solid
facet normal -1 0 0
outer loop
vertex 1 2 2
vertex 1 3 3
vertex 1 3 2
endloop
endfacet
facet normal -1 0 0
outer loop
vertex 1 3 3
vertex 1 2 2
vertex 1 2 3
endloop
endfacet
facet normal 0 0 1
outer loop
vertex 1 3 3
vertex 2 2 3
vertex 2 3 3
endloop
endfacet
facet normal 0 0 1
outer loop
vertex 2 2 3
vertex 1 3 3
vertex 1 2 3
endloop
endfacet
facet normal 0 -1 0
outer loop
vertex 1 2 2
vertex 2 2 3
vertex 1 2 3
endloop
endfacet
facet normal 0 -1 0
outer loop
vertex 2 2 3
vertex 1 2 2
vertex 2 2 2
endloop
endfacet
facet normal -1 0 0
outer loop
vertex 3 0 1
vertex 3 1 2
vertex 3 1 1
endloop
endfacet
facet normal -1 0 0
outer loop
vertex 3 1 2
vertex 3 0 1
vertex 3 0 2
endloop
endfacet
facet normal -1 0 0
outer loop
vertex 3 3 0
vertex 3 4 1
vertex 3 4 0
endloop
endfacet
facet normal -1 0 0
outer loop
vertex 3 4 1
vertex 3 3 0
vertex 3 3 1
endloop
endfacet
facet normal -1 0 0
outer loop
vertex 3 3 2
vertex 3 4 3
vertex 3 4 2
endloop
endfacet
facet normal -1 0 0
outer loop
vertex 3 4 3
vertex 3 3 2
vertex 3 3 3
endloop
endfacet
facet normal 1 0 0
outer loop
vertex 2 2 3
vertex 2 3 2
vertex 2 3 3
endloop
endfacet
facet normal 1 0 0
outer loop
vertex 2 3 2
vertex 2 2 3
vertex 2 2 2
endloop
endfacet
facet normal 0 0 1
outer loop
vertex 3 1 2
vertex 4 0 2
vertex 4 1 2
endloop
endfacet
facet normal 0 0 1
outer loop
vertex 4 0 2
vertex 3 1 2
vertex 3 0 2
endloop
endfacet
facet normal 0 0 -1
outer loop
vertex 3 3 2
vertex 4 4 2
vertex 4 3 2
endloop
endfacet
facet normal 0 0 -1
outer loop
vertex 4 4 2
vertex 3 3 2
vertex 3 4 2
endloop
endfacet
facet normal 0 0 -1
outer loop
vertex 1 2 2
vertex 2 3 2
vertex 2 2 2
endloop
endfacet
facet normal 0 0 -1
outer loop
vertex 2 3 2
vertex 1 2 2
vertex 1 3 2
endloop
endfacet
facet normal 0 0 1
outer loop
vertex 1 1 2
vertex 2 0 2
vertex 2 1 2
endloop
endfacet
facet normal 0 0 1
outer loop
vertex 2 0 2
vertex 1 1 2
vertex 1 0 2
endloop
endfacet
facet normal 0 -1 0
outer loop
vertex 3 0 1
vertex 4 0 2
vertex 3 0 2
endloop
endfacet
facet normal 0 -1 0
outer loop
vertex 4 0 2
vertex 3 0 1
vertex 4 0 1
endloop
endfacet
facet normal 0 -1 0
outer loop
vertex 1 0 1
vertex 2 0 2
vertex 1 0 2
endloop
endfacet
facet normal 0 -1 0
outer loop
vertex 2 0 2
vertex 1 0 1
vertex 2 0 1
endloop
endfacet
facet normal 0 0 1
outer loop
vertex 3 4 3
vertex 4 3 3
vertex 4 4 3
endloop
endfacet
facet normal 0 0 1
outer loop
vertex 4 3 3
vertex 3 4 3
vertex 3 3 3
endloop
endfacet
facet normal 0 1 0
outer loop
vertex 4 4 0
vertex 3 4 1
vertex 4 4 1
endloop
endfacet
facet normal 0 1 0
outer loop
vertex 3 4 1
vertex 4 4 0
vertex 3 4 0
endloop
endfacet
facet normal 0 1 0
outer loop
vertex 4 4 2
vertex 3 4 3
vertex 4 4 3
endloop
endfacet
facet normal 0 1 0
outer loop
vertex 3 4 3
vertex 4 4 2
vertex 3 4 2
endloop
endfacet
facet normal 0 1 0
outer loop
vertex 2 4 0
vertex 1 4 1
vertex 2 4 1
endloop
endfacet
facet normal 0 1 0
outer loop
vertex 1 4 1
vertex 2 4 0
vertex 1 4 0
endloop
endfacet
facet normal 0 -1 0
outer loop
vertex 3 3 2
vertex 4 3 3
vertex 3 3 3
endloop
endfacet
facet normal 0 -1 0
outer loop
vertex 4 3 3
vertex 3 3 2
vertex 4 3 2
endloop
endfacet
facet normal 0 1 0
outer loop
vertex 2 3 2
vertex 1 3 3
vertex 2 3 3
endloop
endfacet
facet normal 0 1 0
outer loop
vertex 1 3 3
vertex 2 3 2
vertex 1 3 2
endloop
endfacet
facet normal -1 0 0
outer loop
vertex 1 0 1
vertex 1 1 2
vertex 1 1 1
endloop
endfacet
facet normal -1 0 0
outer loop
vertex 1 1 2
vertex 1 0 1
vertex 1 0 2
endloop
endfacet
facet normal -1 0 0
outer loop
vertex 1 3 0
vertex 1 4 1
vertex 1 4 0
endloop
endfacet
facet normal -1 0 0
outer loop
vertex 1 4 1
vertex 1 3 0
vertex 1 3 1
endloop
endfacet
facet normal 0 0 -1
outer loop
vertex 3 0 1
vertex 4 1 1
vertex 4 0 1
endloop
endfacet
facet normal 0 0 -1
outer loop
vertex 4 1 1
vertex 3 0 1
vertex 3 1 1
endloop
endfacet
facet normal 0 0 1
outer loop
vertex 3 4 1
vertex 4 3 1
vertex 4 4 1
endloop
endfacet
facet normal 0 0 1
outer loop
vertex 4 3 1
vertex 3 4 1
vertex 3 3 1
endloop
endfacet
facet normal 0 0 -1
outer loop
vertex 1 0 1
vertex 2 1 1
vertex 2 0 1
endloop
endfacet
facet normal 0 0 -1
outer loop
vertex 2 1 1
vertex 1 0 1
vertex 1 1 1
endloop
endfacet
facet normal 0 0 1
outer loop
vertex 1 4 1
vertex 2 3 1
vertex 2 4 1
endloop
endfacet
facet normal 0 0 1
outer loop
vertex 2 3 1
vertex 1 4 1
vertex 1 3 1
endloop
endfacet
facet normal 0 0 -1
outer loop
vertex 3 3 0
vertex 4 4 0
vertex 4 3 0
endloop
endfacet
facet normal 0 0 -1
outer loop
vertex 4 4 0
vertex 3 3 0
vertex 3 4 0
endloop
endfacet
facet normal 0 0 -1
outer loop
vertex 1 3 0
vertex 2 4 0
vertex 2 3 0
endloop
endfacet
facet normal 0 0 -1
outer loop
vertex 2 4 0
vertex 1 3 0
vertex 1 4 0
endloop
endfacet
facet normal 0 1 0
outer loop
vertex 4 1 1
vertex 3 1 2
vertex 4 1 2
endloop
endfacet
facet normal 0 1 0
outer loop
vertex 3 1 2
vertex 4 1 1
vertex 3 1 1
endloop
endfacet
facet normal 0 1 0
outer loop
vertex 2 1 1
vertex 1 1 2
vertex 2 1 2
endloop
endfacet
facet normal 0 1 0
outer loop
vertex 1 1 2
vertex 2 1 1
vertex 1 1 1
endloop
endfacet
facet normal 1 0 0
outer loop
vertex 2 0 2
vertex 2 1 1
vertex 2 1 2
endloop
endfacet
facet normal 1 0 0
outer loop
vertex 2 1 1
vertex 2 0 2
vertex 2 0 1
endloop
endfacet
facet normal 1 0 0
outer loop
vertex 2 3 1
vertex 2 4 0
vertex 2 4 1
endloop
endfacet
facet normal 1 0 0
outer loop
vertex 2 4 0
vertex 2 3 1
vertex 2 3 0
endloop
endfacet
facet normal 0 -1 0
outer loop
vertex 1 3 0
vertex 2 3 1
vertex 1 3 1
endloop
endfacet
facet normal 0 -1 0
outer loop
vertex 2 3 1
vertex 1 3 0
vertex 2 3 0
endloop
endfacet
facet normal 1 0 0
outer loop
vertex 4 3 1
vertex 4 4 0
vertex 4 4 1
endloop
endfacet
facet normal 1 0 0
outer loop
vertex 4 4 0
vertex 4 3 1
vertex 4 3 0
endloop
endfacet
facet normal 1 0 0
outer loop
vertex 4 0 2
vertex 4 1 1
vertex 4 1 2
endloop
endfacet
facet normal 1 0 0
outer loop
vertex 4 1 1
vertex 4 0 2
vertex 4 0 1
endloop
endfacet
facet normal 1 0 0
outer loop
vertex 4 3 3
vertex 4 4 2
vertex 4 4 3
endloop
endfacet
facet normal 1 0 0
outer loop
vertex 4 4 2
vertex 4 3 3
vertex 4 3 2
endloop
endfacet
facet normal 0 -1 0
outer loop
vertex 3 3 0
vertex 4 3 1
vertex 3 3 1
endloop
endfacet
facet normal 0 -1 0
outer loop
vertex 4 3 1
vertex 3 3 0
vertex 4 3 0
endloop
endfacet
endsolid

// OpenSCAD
module square(vals) {
	for(r = vals[0]) for(g = vals[1]) for(b = vals[2]) translate([r, g, b]) cube(1);
}
function clamp(v, mn, mx) = min(max(v, mn), mx);
function hueToRgb(h) = [
	clamp(abs(3-6*h) - 1, 0, 1),
	clamp(2-abs(2-6*h), 0, 1),
	clamp(2-abs(4-6*h), 0, 1)
];
squareVals = [
	[[0,2],[1],[3]],
	[[0,1,2],[0,1,3],[2]],
	[[0,2],[1,3],[0]],
	[[0,2],[2],[0,2,3]],
	[[1],[0,1,2],[0,3]],
	[[0,2],[0],[0,1,3]],
	[[0,1,2,3],[3],[1,3]],
	[[3],[0,1,2],[0,2,3]],
	[[0,1,2,3],[1,2],[1]]
];
difference() {
	cube([4, 4, 4]);
union() {
color(hueToRgb(0 / len(squareVals))) square(squareVals[0]);
color(hueToRgb(1 / len(squareVals))) square(squareVals[1]);
color(hueToRgb(2 / len(squareVals))) square(squareVals[2]);
color(hueToRgb(3 / len(squareVals))) square(squareVals[3]);
color(hueToRgb(4 / len(squareVals))) square(squareVals[4]);
color(hueToRgb(5 / len(squareVals))) square(squareVals[5]);
color(hueToRgb(6 / len(squareVals))) square(squareVals[6]);
color(hueToRgb(7 / len(squareVals))) square(squareVals[7]);
color(hueToRgb(8 / len(squareVals))) square(squareVals[8]);
}
}

// red 1, green 0, blue 1
// red 3, green 0, blue 1
// red 1, green 2, blue 2
